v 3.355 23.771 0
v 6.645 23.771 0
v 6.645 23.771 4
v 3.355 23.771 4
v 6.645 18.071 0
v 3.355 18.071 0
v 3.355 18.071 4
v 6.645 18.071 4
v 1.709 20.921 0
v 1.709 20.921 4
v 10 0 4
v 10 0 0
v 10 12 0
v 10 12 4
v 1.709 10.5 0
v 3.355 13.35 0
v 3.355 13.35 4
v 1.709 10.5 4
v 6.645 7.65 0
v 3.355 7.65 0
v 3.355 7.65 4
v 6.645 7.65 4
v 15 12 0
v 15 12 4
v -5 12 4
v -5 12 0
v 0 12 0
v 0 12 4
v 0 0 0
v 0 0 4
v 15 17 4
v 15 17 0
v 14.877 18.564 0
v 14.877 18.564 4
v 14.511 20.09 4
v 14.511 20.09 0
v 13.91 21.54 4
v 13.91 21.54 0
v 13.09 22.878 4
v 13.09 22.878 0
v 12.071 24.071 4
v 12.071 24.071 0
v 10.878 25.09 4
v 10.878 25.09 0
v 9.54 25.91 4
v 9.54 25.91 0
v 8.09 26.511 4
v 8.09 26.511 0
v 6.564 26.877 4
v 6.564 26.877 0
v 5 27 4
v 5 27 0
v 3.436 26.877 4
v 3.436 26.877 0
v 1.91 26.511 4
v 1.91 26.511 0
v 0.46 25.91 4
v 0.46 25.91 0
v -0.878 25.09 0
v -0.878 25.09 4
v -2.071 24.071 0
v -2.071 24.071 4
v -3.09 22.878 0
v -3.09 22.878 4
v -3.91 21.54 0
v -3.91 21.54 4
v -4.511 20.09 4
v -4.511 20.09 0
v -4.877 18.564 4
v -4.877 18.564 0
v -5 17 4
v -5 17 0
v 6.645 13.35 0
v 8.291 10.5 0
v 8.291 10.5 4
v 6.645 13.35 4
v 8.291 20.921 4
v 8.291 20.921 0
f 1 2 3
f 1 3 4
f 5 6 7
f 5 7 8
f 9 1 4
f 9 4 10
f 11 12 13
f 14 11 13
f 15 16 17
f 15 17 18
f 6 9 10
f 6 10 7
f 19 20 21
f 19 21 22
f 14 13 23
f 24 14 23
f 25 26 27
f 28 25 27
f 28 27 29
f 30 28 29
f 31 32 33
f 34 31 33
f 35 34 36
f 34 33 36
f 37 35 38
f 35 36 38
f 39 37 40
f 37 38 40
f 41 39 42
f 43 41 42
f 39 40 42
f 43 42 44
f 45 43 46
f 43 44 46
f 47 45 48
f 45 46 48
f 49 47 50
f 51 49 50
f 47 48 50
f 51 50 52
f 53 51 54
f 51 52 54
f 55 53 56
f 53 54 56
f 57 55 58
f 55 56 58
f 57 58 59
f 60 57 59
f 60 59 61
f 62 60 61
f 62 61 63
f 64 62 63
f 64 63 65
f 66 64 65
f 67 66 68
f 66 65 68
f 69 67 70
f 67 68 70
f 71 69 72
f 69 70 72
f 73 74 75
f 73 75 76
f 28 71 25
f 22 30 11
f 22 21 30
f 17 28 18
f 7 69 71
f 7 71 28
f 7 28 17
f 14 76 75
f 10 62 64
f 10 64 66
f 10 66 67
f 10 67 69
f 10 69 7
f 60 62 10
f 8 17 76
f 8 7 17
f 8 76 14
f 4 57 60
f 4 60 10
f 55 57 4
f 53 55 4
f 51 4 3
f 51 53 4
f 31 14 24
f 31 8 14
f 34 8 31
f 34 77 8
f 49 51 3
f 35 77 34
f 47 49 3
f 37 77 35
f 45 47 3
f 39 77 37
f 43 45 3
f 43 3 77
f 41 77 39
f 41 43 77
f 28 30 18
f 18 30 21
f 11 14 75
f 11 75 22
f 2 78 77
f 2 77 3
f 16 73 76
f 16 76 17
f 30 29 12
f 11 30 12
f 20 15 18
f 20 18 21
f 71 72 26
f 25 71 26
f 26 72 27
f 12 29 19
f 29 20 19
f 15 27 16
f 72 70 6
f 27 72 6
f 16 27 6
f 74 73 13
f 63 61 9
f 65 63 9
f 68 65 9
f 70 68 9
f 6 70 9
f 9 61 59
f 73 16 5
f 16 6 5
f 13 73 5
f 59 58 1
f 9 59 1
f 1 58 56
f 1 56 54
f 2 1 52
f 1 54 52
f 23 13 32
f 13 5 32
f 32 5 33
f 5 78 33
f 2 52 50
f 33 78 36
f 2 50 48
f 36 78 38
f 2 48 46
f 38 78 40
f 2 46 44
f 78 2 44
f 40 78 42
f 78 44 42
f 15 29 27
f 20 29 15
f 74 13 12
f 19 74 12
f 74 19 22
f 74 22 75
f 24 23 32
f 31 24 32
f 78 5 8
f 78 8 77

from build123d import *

# Parameters (mm, degrees)
BOSS_EXTRUDE1_DEPTH = 4
SKETCH2_W           = 2.5
SKETCH2_H           = 4
CUT_EXTRUDE1_DEPTH  = 4


with BuildPart() as part:
    # Sketch1 → Boss-Extrude1 (new body)
    with BuildSketch(Plane.XY):
        with BuildLine():
            Line((0, 0), (10, 0))
            Line((10, 0), (10, 4))
            Line((10, 4), (12.5, 4))
            Line((12.5, 4), (12.5, 8))
            Line((12.5, 8), (10, 8))
            Line((10, 8), (10, 12))
            Line((10, 12), (15, 12))
            Line((15, 12), (15, 17))
            ThreePointArc((15, 17), (5, 27), (-5, 17))
            Line((-5, 17), (-5, 12))
            Line((-5, 12), (0, 12))
            Line((0, 12), (0, 8))
            Line((0, 8), (-2.5, 8))
            Line((-2.5, 8), (-2.5, 4))
            Line((-2.5, 4), (0, 4))
            Line((0, 4), (0, 0))
        make_face()
        Polygon((3.354551733, 18.071172359), (6.645448267, 18.071172359), (8.290896534, 20.921172359), (6.645448267, 23.771172359), (3.354551733, 23.771172359), (1.709103466, 20.921172359), align=None, mode=Mode.SUBTRACT)
        Polygon((8.290896534, 10.5), (6.645448267, 13.35), (3.354551733, 13.35), (1.709103466, 10.5), (3.354551733, 7.65), (6.645448267, 7.65), align=None, mode=Mode.SUBTRACT)
    extrude(amount=BOSS_EXTRUDE1_DEPTH)

    # Sketch2 → Cut-Extrude1 (cut)
    with BuildSketch(Plane.XY.offset(4)):
        with Locations((-1.25, 6)):
            Rectangle(SKETCH2_W, SKETCH2_H)
        with Locations((11.25, 6)):
            Rectangle(SKETCH2_W, SKETCH2_H)
    extrude(amount=-CUT_EXTRUDE1_DEPTH, mode=Mode.SUBTRACT)


solid = part.part
